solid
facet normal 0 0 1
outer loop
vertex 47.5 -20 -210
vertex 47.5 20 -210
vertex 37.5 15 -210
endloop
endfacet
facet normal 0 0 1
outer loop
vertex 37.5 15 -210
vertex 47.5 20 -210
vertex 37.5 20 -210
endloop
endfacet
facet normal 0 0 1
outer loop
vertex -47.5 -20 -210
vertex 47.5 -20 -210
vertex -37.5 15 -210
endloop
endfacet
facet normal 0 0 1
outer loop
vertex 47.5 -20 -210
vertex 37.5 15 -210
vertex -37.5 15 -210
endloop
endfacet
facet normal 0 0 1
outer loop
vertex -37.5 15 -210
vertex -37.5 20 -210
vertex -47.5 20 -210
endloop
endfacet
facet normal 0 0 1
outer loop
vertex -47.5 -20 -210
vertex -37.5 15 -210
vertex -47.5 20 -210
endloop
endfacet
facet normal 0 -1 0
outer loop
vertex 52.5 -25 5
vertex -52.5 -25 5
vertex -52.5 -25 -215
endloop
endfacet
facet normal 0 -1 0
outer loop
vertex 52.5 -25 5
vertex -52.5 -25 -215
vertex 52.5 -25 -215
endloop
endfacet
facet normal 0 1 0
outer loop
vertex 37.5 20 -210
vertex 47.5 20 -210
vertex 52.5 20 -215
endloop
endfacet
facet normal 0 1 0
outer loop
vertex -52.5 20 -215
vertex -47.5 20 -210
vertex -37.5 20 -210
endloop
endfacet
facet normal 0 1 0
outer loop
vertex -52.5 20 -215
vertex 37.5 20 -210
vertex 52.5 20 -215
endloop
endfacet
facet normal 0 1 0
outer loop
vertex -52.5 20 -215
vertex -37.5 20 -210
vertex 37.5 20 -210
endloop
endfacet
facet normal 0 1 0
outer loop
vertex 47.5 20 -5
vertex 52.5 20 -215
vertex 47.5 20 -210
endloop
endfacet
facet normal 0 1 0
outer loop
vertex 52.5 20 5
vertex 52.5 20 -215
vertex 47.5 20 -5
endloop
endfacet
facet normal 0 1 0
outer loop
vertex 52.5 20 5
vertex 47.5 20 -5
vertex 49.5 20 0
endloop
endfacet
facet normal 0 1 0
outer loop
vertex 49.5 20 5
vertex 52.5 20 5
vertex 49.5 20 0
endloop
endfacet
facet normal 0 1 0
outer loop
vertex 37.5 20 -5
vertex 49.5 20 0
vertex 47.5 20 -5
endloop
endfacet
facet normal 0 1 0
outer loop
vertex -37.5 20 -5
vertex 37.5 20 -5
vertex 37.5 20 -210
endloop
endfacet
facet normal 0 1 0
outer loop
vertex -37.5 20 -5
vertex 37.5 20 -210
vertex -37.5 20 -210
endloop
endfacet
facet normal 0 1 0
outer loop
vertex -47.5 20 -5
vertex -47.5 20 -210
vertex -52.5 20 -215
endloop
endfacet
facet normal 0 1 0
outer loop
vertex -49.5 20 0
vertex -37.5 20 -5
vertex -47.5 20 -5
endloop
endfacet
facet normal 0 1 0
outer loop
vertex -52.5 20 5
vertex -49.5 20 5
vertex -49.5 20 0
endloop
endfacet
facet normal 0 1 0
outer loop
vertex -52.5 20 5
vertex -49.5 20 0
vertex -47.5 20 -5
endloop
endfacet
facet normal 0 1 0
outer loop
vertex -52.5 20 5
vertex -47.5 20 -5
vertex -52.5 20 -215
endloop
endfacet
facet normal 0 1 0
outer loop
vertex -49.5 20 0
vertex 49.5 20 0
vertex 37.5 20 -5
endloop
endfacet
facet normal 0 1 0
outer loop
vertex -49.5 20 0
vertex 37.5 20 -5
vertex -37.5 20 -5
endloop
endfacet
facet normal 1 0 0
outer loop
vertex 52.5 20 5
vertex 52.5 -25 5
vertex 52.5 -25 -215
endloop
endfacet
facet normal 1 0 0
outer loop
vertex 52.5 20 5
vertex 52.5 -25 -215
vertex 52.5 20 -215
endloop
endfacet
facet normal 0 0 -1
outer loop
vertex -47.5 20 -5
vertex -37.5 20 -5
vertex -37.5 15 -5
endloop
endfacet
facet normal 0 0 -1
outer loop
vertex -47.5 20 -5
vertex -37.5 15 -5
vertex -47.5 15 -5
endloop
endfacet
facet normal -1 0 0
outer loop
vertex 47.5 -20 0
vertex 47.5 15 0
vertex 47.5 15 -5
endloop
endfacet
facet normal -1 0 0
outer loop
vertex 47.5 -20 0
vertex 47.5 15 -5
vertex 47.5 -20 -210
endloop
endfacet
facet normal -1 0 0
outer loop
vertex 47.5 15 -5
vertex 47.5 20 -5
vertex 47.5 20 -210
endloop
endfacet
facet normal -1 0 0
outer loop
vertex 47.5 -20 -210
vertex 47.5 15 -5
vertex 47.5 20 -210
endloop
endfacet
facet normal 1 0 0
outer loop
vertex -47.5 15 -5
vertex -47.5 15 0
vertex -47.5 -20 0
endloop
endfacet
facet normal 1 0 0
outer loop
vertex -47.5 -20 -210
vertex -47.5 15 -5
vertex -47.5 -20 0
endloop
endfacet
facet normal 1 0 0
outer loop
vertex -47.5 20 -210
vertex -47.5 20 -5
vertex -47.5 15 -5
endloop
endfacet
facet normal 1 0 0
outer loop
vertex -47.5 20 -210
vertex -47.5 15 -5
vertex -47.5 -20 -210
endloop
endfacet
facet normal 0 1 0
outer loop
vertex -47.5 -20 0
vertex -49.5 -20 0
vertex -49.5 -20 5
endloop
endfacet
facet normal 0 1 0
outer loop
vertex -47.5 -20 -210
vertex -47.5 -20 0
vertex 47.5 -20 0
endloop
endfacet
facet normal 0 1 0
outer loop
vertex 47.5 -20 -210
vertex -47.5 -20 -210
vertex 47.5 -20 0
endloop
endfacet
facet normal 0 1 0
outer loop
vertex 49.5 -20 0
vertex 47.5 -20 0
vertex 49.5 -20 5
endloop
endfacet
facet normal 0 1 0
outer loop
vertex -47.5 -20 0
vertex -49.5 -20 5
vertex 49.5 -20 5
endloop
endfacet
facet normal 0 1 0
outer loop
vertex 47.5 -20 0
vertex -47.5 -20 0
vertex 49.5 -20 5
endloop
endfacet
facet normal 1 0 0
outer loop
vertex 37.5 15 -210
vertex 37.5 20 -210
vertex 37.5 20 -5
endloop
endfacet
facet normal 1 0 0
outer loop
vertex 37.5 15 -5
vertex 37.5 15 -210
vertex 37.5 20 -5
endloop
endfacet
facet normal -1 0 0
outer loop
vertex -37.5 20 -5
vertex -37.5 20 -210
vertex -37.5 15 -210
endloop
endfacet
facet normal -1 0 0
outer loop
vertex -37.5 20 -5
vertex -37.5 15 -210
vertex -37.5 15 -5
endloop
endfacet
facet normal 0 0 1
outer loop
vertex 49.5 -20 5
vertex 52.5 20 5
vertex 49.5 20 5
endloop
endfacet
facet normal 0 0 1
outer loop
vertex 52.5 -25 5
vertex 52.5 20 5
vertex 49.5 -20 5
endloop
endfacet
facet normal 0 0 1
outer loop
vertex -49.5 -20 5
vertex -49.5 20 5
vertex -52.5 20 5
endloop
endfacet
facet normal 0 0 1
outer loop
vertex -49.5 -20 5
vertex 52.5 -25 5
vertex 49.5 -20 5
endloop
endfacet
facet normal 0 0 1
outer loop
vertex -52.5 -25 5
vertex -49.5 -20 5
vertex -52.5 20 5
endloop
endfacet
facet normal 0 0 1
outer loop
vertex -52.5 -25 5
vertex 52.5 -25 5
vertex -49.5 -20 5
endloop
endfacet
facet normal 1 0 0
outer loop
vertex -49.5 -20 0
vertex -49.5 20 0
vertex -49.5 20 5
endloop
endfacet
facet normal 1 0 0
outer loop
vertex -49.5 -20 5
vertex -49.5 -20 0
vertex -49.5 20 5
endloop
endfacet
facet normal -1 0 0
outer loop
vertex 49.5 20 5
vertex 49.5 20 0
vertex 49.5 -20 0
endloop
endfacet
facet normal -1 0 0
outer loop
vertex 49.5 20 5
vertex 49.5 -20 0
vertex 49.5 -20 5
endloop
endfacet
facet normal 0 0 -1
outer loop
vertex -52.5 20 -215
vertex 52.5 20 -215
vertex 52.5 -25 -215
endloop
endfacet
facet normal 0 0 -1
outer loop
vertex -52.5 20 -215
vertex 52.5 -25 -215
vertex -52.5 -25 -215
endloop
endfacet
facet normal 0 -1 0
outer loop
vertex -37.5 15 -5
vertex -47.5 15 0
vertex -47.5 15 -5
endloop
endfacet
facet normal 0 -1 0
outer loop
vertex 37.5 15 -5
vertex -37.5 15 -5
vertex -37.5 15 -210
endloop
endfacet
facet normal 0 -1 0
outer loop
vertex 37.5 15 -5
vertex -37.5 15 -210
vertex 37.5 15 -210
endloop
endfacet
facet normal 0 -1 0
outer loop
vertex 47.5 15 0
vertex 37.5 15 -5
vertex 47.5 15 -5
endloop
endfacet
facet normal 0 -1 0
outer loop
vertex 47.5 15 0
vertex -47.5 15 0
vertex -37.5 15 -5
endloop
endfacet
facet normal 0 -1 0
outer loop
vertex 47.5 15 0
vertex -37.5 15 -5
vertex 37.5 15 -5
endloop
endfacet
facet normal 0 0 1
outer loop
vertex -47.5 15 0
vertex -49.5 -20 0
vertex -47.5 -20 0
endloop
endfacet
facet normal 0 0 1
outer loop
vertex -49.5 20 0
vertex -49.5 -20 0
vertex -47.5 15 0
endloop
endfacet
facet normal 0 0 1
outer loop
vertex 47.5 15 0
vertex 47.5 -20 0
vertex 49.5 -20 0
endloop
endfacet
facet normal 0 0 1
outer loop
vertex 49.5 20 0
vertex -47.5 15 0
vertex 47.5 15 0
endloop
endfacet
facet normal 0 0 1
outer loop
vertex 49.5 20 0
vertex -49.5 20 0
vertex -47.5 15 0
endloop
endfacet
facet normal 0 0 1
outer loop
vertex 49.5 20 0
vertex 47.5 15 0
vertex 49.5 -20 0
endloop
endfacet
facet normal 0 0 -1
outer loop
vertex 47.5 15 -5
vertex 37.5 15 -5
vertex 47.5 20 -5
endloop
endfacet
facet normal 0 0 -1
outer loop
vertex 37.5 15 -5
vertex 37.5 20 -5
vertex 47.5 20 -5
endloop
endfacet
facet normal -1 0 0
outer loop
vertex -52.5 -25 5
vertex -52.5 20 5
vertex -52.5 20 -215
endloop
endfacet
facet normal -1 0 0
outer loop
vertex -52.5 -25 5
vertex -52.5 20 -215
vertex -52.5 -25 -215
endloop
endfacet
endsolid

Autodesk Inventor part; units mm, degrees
ref_plane "YZ Plane" through (0, 0, 0) normal (1, 0, 0) x (0, 1, 0)
ref_plane "XZ Plane" through (0, 0, 0) normal (0, 1, 0) x (-1, 0, 0)
ref_plane "XY Plane" through (0, 0, 0) normal (0, 0, 1) x (1, 0, 0)
sketch "Sketch2" plane through (0, 0, 0) normal (0, 0, 1) x (1, 0, 0)
  line L0 (-47.5, 20) -> (47.5, 20)
  line L1 (47.5, 20) -> (47.5, -25)
  line L2 (47.5, -25) -> (-47.5, -25)
  line L3 (-47.5, -25) -> (-47.5, 20)
  line L4 (-52.5, 20) -> (52.5, 20)
  line L5 (52.5, 20) -> (52.5, -25)
  line L6 (52.5, -25) -> (-52.5, -25)
  line L7 (-52.5, -25) -> (-52.5, 20)
  line L8 (-47.5, 15) -> (47.5, 15)
  line L9 (47.5, 15) -> (47.5, -20)
  line L10 (47.5, -20) -> (-47.5, -20)
  line L11 (-47.5, -20) -> (-47.5, 15)
  point P0 (0, 0)
  dimension "d4" = 95
  dimension "d5" = 45
  dimension "d6" = 47.5
  dimension "d7" = 20
  dimension "d8" = 5
  dimension "d9" = 5
  dimension "d10" = 5
  dimension "d11" = 5
  dimension "d12" = 45
  dimension "d13" = 5
extrude "Extrusion1" add sketch "Sketch2" against normal blind 210 contours L0 L1 L8 L3 | L3 L6 L7 L4 | L4 L5 L6 L1 | L10 L1 L2 L3
sketch "Sketch3" plane through (0, 0, -210) normal (0, 0, -1) x (-1, 0, 0)
  point P0 (0, 0)
sketch "Sketch4" plane through (0, 0, -210) normal (0, 0, -1) x (-1, 0, 0)
  line L0 (-52.5, -25) -> (-52.5, 20) projected
  line L1 (52.5, -25) -> (-52.5, -25) projected
  line L2 (-52.5, 20) -> (52.5, 20)
  line L3 (52.5, 20) -> (52.5, -25)
  line L4 (52.5, -25) -> (-52.5, -25)
  line L5 (-52.5, -25) -> (-52.5, 20)
  point P0 (0, 0)
extrude "Extrusion2" add sketch "Sketch4" along normal blind 5
sketch "Sketch8" plane through (-52.5, 20, -215) normal (0, 1, 0) x (1, 0, 0)
  line L0 (5, -215) -> (5, -5) projected
  line L1 (5, -5) -> (15, -5)
  line L2 (15, -5) -> (15, -210)
  line L3 (15, -210) -> (5, -210)
  line L4 (5, -210) -> (5, -5)
  line L5 (100, -215) -> (100, -5) projected
  line L6 (100, -5) -> (90, -5)
  line L7 (90, -5) -> (90, -210)
  line L8 (90, -210) -> (100, -210)
  line L9 (100, -210) -> (100, -5)
  point P0 (52.5, -215)
  point P1 (100, -210)
  dimension "d33" = 10
  dimension "d34" = 205
  dimension "d35" = 10
extrude "Extrusion6" cut sketch "Sketch8" against normal blind 5
sketch "Sketch11" plane through (-52.5, -25, 0) normal (0, -1, 0) x (1, 0, 0)
  line L0 (0, 0) -> (0, -215) projected
  line L1 (0, 0) -> (105, 0)
  line L2 (105, 0) -> (105, 5)
  line L3 (105, 5) -> (0, 5)
  line L4 (0, 5) -> (0, 0)
  line L5 (0, 0) -> (105, 0) projected
  line L6 (0, 0) -> (3, 0)
  line L7 (3, 0) -> (3, 5)
  line L8 (3, 5) -> (0, 5)
  line L9 (0, 5) -> (0, 0)
  line L10 (105, 0) -> (102, 0)
  line L11 (102, 0) -> (102, 5)
  line L12 (102, 5) -> (105, 5)
  line L13 (105, 5) -> (105, 0)
  point P0 (52.5, 0)
  point P1 (3, 0)
  dimension "d48" = 5
  dimension "d49" = 3
  dimension "d50" = 3
extrude "Extrusion9" add sketch "Sketch11" against normal blind 5 contours L7 L3 L11 L1
extrude "Extrusion10" add sketch "Sketch11" against normal blind 45 contours L4 L3 L7 L1 | L11 L3 L2 L1
properties part number "Team29_PiBox"
